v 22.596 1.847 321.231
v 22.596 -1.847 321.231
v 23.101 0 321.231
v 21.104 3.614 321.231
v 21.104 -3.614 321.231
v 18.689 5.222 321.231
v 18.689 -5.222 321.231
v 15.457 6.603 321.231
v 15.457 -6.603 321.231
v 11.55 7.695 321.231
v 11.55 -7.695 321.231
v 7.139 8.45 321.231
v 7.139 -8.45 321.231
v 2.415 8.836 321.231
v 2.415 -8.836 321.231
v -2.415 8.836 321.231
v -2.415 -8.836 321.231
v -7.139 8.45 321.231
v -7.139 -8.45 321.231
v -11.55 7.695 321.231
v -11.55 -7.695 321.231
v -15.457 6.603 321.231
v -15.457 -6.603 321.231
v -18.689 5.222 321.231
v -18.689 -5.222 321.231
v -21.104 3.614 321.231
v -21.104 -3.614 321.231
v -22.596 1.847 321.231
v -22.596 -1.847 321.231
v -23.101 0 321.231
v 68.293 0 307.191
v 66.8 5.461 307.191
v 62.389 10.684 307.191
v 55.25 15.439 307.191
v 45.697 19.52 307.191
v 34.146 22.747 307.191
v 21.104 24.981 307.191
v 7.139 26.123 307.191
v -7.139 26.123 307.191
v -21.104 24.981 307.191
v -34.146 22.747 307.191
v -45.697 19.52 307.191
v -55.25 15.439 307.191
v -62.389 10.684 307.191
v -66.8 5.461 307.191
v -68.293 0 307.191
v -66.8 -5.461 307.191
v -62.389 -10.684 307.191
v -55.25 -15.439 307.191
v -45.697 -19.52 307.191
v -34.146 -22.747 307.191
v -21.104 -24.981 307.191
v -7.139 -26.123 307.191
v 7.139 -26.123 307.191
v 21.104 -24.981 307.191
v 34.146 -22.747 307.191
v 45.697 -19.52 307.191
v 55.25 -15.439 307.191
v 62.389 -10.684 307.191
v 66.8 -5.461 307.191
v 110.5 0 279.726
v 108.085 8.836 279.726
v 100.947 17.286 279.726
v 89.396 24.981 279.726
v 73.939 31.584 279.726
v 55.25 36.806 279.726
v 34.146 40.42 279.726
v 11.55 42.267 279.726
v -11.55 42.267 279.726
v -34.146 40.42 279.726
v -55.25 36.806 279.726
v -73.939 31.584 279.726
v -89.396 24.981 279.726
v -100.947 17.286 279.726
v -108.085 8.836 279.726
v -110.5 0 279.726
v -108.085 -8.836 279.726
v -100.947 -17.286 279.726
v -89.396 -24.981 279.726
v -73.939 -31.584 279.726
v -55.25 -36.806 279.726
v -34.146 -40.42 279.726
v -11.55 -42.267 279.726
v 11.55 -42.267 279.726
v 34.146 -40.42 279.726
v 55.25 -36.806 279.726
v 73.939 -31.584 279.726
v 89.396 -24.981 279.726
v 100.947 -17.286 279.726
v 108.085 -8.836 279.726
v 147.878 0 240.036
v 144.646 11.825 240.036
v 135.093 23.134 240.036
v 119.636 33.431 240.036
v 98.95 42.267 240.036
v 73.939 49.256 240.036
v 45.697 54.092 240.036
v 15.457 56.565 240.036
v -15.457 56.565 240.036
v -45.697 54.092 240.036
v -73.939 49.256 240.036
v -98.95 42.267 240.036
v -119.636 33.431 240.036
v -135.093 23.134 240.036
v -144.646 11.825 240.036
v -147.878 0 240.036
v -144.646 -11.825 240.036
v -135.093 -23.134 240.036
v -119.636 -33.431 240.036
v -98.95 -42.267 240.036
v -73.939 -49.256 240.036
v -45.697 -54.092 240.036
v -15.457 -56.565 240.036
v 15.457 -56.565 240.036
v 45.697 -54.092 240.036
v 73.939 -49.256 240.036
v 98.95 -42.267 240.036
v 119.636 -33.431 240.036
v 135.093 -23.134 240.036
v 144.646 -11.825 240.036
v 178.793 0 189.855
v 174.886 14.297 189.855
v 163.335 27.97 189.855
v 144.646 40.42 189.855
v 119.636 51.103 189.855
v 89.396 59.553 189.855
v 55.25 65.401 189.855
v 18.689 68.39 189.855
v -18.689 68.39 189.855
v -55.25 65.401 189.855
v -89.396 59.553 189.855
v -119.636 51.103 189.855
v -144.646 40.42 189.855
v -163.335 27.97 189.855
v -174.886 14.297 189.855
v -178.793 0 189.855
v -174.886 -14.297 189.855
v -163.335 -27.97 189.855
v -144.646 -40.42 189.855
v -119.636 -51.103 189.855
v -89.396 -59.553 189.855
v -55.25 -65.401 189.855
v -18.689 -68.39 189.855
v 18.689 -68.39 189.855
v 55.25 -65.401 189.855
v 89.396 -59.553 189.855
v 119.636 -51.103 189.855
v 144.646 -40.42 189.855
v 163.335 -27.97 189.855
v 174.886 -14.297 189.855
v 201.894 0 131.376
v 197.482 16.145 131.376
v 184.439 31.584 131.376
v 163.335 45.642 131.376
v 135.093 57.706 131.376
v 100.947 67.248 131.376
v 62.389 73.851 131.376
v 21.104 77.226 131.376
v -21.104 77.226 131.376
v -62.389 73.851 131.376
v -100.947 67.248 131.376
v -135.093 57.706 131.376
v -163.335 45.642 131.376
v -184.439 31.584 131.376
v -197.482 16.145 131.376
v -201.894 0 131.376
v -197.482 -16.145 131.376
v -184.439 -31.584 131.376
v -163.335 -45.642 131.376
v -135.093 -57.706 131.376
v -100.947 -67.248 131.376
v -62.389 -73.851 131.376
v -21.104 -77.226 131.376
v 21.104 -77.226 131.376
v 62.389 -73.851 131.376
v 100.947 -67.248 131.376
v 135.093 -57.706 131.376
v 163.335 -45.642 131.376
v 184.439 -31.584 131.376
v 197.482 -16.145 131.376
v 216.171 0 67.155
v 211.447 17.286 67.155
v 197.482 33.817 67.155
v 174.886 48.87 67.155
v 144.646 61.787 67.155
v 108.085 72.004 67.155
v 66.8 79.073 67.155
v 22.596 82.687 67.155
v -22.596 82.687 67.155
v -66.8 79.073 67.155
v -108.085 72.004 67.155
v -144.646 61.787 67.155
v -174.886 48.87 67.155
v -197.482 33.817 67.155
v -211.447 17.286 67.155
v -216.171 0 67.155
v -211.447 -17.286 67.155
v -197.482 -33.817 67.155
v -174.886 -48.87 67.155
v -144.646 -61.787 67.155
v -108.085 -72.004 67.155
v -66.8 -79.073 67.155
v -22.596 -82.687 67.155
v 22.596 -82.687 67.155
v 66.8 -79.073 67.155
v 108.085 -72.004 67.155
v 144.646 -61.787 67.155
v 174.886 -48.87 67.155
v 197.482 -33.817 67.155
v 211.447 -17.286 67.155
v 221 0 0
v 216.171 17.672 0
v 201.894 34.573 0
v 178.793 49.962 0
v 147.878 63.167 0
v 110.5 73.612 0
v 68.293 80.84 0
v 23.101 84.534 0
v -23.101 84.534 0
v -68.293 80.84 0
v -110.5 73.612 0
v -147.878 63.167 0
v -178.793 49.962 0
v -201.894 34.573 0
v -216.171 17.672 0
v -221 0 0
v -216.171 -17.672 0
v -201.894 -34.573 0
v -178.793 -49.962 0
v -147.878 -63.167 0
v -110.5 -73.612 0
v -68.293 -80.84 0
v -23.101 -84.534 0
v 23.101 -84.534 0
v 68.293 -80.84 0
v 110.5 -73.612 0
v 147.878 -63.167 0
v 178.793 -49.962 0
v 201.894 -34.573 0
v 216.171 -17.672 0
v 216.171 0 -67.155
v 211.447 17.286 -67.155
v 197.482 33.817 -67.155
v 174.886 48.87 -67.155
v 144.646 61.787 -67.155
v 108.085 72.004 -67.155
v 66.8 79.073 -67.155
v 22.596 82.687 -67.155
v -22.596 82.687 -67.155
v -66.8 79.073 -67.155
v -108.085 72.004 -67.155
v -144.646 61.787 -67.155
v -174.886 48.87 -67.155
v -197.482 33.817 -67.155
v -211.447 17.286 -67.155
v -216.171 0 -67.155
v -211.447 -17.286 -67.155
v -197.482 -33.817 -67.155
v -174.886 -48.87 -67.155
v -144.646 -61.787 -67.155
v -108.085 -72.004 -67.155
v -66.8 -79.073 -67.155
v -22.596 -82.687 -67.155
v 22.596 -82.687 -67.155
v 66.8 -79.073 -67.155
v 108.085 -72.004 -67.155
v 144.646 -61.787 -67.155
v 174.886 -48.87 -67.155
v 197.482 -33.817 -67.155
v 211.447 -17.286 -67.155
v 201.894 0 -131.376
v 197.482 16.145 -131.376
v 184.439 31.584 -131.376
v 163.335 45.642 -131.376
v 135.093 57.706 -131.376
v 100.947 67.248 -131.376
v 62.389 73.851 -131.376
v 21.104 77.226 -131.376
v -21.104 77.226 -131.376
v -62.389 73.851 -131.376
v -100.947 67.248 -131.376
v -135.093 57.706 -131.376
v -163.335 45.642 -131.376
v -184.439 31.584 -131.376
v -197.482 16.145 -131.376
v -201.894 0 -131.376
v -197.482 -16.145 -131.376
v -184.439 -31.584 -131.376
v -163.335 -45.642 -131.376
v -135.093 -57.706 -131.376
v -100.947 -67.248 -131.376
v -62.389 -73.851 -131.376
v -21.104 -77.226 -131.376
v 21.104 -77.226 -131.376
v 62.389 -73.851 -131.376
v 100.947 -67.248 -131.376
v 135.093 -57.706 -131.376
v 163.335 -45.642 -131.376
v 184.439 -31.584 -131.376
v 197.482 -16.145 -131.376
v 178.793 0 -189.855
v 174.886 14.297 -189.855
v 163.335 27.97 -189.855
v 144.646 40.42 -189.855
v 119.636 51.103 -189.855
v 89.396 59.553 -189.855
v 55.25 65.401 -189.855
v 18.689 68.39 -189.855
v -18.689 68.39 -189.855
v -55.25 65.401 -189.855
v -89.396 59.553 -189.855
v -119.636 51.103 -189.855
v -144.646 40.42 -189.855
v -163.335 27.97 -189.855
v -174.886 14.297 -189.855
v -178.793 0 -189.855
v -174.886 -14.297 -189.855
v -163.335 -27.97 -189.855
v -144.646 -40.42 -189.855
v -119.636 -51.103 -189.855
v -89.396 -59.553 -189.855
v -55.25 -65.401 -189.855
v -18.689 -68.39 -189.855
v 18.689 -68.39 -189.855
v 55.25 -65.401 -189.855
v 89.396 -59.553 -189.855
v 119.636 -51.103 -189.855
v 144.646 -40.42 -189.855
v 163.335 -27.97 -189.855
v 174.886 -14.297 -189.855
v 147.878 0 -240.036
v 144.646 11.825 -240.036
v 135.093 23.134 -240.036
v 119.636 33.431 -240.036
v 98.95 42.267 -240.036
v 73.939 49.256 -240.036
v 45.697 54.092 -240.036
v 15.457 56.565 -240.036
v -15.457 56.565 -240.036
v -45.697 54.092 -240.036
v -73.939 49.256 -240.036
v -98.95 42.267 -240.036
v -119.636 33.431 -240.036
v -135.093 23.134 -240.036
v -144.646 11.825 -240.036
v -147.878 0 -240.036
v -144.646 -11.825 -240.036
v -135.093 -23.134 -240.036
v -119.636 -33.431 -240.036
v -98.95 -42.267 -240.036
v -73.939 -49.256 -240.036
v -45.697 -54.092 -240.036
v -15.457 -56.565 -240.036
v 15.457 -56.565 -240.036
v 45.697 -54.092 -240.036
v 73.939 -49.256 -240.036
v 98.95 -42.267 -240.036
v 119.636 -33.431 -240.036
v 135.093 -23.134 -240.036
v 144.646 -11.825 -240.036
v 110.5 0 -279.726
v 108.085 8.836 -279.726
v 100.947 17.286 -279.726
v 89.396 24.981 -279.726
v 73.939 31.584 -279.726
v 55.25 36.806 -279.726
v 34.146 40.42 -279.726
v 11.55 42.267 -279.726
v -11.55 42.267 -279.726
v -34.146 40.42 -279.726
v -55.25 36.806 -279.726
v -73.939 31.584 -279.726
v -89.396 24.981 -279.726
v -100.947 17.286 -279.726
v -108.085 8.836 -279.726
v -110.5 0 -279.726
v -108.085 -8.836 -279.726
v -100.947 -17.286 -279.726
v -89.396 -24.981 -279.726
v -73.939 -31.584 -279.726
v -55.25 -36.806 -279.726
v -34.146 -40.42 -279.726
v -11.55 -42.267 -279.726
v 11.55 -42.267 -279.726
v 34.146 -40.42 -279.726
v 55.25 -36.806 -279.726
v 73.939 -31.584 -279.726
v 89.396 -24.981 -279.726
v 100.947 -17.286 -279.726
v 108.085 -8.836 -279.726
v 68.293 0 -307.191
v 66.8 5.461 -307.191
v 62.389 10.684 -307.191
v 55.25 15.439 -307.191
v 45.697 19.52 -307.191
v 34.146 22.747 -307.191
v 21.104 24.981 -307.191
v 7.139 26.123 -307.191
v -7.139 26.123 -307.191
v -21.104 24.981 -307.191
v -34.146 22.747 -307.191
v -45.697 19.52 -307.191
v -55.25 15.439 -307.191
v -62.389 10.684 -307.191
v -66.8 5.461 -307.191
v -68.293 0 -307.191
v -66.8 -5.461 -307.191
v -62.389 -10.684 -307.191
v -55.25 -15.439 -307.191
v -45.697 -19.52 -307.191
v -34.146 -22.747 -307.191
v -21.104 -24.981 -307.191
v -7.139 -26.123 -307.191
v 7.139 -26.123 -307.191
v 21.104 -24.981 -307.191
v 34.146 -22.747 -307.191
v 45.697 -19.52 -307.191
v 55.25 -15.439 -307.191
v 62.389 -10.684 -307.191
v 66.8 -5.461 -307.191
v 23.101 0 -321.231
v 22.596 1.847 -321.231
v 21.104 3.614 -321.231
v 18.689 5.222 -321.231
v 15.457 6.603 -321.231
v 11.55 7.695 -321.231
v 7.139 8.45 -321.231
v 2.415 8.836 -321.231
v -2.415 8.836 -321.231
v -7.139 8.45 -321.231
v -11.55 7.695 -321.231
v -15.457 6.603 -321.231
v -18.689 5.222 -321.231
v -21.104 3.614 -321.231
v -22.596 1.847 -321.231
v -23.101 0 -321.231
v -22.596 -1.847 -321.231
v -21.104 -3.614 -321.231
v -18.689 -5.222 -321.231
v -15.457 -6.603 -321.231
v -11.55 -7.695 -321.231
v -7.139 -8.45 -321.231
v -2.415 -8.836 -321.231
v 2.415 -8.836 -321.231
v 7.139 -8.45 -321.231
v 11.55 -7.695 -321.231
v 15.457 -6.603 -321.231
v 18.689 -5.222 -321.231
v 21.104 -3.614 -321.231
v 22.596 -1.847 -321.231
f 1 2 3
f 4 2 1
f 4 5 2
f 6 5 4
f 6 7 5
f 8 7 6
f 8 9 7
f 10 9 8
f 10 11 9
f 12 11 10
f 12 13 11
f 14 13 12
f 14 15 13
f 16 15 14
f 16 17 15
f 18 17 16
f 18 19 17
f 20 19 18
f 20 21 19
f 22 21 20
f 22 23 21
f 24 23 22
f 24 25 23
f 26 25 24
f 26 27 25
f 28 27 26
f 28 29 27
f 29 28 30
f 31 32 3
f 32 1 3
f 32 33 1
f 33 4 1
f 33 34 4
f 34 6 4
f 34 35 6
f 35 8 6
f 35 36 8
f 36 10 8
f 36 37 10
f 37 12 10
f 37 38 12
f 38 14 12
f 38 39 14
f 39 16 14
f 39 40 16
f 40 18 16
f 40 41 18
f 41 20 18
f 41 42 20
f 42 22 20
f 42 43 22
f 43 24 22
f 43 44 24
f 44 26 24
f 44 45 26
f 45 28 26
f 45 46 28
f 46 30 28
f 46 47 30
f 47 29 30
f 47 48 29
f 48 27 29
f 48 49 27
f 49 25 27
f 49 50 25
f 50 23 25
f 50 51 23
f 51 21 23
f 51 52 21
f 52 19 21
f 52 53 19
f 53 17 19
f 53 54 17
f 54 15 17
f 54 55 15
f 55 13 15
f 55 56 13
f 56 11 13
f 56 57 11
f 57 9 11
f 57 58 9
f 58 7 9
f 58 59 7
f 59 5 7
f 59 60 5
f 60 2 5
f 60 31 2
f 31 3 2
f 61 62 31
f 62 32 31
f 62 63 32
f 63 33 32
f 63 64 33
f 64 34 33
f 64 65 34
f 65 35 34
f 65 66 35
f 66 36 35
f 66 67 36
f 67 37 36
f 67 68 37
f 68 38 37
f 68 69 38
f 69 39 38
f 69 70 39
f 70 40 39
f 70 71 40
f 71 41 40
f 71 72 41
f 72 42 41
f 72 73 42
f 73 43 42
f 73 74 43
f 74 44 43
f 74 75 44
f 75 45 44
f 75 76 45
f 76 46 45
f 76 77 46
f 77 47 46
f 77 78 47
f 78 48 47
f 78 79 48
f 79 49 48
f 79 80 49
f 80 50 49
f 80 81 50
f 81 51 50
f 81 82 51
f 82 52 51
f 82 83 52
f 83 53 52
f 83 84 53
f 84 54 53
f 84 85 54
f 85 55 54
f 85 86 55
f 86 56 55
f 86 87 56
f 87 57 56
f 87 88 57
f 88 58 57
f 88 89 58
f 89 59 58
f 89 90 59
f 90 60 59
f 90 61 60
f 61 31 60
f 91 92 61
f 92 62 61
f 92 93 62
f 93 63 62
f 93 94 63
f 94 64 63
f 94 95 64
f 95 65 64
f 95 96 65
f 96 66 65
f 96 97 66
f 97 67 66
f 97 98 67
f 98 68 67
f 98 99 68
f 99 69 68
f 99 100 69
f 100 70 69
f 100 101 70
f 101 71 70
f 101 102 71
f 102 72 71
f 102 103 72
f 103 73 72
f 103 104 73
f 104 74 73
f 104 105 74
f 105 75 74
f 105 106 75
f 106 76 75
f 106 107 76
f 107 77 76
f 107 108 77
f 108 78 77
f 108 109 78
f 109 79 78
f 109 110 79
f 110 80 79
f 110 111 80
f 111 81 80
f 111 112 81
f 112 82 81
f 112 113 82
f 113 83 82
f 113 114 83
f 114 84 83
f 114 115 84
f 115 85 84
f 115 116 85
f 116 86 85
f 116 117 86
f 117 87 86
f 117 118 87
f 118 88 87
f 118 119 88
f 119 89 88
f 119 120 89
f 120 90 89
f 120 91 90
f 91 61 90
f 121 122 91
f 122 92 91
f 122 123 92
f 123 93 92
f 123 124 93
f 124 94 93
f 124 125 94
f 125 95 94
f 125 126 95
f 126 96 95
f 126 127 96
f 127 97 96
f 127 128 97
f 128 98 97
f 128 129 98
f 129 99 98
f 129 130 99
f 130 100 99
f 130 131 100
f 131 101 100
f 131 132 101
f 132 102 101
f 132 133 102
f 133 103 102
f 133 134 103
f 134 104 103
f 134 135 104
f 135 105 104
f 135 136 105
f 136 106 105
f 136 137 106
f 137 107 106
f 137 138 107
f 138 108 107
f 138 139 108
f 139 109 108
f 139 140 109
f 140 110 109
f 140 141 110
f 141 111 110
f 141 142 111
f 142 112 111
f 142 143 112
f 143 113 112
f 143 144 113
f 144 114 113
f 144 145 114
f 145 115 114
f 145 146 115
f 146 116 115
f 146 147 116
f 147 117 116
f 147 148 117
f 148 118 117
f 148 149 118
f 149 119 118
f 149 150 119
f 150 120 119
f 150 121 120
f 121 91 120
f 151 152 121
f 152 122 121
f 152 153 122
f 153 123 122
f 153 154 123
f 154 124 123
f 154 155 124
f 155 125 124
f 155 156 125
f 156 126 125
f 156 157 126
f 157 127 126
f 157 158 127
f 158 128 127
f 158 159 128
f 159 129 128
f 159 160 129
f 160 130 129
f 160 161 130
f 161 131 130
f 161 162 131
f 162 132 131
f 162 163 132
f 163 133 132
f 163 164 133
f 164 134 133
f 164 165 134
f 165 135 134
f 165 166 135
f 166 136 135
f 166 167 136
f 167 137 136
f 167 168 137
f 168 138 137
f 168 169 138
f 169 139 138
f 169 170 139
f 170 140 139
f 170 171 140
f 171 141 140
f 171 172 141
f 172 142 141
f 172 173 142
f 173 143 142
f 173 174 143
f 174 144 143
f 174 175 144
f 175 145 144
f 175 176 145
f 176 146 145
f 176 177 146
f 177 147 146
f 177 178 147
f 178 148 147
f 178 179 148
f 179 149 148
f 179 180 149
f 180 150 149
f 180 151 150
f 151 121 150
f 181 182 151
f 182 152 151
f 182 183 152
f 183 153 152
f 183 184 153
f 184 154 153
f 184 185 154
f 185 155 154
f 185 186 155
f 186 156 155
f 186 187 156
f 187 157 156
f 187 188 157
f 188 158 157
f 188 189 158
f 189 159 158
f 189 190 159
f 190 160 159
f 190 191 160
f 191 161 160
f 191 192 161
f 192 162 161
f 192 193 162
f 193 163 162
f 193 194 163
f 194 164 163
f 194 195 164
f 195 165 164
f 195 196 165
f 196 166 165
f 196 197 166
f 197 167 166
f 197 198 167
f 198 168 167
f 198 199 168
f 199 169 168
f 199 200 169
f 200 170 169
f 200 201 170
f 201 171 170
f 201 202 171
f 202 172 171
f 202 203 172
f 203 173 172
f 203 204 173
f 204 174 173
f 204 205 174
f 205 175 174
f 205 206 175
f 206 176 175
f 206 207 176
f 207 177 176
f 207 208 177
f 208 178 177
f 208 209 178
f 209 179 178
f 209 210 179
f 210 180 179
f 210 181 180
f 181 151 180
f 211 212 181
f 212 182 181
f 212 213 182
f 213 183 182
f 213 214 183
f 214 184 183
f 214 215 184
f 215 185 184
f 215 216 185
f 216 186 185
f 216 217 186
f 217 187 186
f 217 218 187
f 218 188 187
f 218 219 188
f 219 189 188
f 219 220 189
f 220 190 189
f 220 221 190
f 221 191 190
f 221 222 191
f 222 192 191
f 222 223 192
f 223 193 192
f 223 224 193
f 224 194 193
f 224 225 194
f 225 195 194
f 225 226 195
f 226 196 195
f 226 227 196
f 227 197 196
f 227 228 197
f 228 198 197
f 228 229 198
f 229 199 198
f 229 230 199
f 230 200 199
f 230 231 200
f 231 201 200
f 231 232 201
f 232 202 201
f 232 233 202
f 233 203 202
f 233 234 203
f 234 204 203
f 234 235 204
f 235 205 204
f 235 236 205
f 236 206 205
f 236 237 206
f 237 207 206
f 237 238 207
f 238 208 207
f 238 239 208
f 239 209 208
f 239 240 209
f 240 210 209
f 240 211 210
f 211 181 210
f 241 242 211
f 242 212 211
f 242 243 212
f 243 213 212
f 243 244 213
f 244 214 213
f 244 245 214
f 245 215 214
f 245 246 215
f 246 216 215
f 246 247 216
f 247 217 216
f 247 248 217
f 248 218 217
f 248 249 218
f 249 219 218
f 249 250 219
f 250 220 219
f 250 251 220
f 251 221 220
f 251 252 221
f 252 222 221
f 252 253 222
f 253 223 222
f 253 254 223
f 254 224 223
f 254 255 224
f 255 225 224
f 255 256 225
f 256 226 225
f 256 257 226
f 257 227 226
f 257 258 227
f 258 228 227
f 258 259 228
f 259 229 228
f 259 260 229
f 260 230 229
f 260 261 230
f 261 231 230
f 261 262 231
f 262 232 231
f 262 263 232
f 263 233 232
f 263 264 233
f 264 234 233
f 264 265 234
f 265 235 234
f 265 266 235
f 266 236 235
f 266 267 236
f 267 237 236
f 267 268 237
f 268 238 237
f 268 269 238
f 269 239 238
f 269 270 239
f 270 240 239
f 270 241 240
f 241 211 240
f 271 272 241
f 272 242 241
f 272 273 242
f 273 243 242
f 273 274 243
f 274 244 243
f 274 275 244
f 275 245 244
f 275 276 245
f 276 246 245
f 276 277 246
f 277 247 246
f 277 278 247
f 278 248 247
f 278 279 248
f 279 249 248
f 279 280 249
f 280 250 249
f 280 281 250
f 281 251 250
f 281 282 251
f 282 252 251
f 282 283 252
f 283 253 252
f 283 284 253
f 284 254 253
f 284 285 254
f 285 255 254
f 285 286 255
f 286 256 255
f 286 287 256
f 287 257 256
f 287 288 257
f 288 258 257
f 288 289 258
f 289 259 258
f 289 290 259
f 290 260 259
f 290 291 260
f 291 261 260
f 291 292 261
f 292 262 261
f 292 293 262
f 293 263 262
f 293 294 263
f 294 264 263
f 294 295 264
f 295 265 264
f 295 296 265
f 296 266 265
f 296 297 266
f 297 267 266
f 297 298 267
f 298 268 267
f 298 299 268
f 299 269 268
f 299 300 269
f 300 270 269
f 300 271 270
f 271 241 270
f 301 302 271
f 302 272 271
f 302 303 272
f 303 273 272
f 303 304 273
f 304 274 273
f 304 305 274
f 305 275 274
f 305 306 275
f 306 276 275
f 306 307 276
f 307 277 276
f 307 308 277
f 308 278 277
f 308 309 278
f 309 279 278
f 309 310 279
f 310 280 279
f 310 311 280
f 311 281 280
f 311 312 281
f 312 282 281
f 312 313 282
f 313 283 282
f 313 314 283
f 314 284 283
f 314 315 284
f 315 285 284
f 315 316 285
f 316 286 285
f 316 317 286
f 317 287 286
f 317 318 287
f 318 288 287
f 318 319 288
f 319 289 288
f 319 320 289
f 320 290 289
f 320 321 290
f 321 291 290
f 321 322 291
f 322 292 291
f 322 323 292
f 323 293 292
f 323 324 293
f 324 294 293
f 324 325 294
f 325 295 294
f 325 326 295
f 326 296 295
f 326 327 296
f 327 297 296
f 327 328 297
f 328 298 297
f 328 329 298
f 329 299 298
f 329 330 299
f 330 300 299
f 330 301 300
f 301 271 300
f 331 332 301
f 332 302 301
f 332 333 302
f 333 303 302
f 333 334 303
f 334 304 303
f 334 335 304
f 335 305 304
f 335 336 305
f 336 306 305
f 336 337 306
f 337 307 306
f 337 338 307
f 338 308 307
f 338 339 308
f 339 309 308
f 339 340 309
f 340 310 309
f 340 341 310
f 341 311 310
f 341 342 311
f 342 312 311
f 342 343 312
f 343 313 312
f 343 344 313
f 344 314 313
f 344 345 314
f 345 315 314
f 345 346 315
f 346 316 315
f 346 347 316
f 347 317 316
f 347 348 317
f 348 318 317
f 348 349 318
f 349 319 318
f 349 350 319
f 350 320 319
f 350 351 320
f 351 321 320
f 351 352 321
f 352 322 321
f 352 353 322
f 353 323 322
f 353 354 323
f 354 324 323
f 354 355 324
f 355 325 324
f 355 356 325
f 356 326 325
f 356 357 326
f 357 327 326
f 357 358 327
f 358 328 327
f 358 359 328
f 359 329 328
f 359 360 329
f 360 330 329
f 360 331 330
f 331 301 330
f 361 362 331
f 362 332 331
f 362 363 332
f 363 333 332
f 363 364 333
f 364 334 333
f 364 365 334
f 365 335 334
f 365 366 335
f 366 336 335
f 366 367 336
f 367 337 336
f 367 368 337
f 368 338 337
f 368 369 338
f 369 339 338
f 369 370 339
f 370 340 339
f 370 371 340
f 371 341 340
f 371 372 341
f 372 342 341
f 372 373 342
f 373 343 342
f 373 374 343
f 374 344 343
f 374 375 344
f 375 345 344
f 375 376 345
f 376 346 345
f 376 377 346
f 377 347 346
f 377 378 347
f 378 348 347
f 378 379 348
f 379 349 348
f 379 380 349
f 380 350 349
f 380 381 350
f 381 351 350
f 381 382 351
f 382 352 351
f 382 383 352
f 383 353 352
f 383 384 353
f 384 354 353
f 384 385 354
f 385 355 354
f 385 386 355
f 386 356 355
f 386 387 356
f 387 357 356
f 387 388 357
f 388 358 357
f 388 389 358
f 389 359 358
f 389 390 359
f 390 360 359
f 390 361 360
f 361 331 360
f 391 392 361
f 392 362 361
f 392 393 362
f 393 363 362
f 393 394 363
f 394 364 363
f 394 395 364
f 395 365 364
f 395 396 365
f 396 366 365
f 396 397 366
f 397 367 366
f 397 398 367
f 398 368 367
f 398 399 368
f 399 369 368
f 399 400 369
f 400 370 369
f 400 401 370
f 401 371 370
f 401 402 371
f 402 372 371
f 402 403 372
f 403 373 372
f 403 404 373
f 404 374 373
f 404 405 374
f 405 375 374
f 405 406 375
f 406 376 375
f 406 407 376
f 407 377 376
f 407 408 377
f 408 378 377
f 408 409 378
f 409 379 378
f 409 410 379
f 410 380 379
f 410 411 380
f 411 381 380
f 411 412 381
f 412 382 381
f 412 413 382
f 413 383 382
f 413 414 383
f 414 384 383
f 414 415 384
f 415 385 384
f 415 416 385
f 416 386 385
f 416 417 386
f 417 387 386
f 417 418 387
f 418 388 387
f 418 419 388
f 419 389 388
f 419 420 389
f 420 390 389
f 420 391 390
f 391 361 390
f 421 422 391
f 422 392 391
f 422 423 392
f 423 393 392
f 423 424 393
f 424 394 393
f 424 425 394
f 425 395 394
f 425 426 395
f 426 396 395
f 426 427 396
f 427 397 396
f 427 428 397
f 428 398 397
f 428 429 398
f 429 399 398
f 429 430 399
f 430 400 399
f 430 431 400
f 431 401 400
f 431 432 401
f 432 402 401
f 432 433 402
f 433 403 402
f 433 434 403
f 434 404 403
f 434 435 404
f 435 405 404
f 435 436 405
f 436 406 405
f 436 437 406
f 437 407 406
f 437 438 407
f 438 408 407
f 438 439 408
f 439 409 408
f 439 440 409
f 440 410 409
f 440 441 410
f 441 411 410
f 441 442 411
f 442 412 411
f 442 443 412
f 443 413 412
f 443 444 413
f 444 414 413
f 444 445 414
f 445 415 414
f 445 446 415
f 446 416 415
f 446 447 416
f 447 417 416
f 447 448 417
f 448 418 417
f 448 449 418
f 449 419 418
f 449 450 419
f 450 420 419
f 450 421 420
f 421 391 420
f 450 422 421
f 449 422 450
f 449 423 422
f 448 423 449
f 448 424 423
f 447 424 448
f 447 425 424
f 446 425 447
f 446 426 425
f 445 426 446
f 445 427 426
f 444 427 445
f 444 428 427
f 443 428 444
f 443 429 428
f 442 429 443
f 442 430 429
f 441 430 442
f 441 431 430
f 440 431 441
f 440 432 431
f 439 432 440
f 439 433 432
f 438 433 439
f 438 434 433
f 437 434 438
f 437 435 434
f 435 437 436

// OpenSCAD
// Generated by SolidPython 1.0.1 on 2020-07-29 00:46:50


scale(v = [13, 5, 19]) {
	sphere(r = 17);
}
/***********************************************
*********      SolidPython code:      **********
************************************************
 
# import packages: SolidPython
from solid import *
from solid.utils import *
from itertools import chain, combinations, permutations


class Resize:

    def __init__(self, scad_file):
        self.scad_file = scad_file
        #self.scad_file = import_scad(scad_file)
        # cone/cylinder param:
        self.r1 = 0
        self.r2 = 0
        self.h = 0
        # rectangular prism param:
        self.w = 0
        self.l = 0
        # ellipse param:
        self.r = 0

    # import OpenScad code (file name corresponds to shape)


    # classify shape + parameters
    def assign(self, param1, param2, param3):
        if self.scad_file == 'cone.scad':
            self.r1 = param1
            self.r2 = param2
            self.h = param3
        elif self.scad_file == 'cylinder.scad':
            self.r1 = param1
            self.r2 = param2
            self.h = param3
        elif self.scad_file == 'rectangularPrism.scad':
            self.h = param1
            self.l = param2
            self.w = param3
        else:
            self.r = param1
            self.h = param2

    # resize parameters
    def iterate(self):
        x = range(3, 20, 2)
        i = 1
        if self.scad_file == 'cone.scad':
            tempList = list(permutations(x, 2))
            for temp in tempList:
                param1 = temp[0]
                param2 = temp[1]
                filepath = 'produced_scad_files/' + 'cone' + str(param1) + '_' + str(param2) + '_' + '.scad'
                scad_render_to_file(cylinder(h=param1, r1=param2, r2=0), filepath)

        elif self.scad_file == 'cylinder.scad':
            tempList = list(permutations(x, 3))
            for temp in tempList:
                param1 = temp[0]
                param2 = temp[1]
                filepath = 'produced_scad_files/' + 'cylinder' + str(param1) + '_' + str(param2) + '_' + '.scad'
                scad_render_to_file(cylinder(h=param1, r1=param2, r2=param2), filepath)

        elif self.scad_file == 'rectangularPrism.scad':
            tempList = list(permutations(x, 3))
            for temp in tempList:
                param1 = temp[0]
                param2 = temp[1]
                param3 = temp[2]
                filepath = 'produced_scad_files/' + 'rectangularPrism' + str(param1) + '_' + str(param2) + '_' + str(
                    param3) + '.scad'
                scad_render_to_file(cube(size=(param1, param2, param3)), filepath)

        elif self.scad_file == 'ellipse.scad':
            tempList = list(permutations(x, 4))
            for temp in tempList:
                param1 = temp[0]
                param2 = temp[1]
                param3 = temp[2]
                param4 = temp[3]
                filepath = 'produced_scad_files/' + 'ellipse' + str(param1) + '_' + str(param2) + '_' + str(param3) + '_' + str(param4) + '.scad'
                scad_render_to_file(scale([param1, param2, param3])(sphere(r=param4)), filepath)

    def render_to_scadfile(self):
        scad_render_to_file(scad, 'example.scad') 
 
************************************************/
